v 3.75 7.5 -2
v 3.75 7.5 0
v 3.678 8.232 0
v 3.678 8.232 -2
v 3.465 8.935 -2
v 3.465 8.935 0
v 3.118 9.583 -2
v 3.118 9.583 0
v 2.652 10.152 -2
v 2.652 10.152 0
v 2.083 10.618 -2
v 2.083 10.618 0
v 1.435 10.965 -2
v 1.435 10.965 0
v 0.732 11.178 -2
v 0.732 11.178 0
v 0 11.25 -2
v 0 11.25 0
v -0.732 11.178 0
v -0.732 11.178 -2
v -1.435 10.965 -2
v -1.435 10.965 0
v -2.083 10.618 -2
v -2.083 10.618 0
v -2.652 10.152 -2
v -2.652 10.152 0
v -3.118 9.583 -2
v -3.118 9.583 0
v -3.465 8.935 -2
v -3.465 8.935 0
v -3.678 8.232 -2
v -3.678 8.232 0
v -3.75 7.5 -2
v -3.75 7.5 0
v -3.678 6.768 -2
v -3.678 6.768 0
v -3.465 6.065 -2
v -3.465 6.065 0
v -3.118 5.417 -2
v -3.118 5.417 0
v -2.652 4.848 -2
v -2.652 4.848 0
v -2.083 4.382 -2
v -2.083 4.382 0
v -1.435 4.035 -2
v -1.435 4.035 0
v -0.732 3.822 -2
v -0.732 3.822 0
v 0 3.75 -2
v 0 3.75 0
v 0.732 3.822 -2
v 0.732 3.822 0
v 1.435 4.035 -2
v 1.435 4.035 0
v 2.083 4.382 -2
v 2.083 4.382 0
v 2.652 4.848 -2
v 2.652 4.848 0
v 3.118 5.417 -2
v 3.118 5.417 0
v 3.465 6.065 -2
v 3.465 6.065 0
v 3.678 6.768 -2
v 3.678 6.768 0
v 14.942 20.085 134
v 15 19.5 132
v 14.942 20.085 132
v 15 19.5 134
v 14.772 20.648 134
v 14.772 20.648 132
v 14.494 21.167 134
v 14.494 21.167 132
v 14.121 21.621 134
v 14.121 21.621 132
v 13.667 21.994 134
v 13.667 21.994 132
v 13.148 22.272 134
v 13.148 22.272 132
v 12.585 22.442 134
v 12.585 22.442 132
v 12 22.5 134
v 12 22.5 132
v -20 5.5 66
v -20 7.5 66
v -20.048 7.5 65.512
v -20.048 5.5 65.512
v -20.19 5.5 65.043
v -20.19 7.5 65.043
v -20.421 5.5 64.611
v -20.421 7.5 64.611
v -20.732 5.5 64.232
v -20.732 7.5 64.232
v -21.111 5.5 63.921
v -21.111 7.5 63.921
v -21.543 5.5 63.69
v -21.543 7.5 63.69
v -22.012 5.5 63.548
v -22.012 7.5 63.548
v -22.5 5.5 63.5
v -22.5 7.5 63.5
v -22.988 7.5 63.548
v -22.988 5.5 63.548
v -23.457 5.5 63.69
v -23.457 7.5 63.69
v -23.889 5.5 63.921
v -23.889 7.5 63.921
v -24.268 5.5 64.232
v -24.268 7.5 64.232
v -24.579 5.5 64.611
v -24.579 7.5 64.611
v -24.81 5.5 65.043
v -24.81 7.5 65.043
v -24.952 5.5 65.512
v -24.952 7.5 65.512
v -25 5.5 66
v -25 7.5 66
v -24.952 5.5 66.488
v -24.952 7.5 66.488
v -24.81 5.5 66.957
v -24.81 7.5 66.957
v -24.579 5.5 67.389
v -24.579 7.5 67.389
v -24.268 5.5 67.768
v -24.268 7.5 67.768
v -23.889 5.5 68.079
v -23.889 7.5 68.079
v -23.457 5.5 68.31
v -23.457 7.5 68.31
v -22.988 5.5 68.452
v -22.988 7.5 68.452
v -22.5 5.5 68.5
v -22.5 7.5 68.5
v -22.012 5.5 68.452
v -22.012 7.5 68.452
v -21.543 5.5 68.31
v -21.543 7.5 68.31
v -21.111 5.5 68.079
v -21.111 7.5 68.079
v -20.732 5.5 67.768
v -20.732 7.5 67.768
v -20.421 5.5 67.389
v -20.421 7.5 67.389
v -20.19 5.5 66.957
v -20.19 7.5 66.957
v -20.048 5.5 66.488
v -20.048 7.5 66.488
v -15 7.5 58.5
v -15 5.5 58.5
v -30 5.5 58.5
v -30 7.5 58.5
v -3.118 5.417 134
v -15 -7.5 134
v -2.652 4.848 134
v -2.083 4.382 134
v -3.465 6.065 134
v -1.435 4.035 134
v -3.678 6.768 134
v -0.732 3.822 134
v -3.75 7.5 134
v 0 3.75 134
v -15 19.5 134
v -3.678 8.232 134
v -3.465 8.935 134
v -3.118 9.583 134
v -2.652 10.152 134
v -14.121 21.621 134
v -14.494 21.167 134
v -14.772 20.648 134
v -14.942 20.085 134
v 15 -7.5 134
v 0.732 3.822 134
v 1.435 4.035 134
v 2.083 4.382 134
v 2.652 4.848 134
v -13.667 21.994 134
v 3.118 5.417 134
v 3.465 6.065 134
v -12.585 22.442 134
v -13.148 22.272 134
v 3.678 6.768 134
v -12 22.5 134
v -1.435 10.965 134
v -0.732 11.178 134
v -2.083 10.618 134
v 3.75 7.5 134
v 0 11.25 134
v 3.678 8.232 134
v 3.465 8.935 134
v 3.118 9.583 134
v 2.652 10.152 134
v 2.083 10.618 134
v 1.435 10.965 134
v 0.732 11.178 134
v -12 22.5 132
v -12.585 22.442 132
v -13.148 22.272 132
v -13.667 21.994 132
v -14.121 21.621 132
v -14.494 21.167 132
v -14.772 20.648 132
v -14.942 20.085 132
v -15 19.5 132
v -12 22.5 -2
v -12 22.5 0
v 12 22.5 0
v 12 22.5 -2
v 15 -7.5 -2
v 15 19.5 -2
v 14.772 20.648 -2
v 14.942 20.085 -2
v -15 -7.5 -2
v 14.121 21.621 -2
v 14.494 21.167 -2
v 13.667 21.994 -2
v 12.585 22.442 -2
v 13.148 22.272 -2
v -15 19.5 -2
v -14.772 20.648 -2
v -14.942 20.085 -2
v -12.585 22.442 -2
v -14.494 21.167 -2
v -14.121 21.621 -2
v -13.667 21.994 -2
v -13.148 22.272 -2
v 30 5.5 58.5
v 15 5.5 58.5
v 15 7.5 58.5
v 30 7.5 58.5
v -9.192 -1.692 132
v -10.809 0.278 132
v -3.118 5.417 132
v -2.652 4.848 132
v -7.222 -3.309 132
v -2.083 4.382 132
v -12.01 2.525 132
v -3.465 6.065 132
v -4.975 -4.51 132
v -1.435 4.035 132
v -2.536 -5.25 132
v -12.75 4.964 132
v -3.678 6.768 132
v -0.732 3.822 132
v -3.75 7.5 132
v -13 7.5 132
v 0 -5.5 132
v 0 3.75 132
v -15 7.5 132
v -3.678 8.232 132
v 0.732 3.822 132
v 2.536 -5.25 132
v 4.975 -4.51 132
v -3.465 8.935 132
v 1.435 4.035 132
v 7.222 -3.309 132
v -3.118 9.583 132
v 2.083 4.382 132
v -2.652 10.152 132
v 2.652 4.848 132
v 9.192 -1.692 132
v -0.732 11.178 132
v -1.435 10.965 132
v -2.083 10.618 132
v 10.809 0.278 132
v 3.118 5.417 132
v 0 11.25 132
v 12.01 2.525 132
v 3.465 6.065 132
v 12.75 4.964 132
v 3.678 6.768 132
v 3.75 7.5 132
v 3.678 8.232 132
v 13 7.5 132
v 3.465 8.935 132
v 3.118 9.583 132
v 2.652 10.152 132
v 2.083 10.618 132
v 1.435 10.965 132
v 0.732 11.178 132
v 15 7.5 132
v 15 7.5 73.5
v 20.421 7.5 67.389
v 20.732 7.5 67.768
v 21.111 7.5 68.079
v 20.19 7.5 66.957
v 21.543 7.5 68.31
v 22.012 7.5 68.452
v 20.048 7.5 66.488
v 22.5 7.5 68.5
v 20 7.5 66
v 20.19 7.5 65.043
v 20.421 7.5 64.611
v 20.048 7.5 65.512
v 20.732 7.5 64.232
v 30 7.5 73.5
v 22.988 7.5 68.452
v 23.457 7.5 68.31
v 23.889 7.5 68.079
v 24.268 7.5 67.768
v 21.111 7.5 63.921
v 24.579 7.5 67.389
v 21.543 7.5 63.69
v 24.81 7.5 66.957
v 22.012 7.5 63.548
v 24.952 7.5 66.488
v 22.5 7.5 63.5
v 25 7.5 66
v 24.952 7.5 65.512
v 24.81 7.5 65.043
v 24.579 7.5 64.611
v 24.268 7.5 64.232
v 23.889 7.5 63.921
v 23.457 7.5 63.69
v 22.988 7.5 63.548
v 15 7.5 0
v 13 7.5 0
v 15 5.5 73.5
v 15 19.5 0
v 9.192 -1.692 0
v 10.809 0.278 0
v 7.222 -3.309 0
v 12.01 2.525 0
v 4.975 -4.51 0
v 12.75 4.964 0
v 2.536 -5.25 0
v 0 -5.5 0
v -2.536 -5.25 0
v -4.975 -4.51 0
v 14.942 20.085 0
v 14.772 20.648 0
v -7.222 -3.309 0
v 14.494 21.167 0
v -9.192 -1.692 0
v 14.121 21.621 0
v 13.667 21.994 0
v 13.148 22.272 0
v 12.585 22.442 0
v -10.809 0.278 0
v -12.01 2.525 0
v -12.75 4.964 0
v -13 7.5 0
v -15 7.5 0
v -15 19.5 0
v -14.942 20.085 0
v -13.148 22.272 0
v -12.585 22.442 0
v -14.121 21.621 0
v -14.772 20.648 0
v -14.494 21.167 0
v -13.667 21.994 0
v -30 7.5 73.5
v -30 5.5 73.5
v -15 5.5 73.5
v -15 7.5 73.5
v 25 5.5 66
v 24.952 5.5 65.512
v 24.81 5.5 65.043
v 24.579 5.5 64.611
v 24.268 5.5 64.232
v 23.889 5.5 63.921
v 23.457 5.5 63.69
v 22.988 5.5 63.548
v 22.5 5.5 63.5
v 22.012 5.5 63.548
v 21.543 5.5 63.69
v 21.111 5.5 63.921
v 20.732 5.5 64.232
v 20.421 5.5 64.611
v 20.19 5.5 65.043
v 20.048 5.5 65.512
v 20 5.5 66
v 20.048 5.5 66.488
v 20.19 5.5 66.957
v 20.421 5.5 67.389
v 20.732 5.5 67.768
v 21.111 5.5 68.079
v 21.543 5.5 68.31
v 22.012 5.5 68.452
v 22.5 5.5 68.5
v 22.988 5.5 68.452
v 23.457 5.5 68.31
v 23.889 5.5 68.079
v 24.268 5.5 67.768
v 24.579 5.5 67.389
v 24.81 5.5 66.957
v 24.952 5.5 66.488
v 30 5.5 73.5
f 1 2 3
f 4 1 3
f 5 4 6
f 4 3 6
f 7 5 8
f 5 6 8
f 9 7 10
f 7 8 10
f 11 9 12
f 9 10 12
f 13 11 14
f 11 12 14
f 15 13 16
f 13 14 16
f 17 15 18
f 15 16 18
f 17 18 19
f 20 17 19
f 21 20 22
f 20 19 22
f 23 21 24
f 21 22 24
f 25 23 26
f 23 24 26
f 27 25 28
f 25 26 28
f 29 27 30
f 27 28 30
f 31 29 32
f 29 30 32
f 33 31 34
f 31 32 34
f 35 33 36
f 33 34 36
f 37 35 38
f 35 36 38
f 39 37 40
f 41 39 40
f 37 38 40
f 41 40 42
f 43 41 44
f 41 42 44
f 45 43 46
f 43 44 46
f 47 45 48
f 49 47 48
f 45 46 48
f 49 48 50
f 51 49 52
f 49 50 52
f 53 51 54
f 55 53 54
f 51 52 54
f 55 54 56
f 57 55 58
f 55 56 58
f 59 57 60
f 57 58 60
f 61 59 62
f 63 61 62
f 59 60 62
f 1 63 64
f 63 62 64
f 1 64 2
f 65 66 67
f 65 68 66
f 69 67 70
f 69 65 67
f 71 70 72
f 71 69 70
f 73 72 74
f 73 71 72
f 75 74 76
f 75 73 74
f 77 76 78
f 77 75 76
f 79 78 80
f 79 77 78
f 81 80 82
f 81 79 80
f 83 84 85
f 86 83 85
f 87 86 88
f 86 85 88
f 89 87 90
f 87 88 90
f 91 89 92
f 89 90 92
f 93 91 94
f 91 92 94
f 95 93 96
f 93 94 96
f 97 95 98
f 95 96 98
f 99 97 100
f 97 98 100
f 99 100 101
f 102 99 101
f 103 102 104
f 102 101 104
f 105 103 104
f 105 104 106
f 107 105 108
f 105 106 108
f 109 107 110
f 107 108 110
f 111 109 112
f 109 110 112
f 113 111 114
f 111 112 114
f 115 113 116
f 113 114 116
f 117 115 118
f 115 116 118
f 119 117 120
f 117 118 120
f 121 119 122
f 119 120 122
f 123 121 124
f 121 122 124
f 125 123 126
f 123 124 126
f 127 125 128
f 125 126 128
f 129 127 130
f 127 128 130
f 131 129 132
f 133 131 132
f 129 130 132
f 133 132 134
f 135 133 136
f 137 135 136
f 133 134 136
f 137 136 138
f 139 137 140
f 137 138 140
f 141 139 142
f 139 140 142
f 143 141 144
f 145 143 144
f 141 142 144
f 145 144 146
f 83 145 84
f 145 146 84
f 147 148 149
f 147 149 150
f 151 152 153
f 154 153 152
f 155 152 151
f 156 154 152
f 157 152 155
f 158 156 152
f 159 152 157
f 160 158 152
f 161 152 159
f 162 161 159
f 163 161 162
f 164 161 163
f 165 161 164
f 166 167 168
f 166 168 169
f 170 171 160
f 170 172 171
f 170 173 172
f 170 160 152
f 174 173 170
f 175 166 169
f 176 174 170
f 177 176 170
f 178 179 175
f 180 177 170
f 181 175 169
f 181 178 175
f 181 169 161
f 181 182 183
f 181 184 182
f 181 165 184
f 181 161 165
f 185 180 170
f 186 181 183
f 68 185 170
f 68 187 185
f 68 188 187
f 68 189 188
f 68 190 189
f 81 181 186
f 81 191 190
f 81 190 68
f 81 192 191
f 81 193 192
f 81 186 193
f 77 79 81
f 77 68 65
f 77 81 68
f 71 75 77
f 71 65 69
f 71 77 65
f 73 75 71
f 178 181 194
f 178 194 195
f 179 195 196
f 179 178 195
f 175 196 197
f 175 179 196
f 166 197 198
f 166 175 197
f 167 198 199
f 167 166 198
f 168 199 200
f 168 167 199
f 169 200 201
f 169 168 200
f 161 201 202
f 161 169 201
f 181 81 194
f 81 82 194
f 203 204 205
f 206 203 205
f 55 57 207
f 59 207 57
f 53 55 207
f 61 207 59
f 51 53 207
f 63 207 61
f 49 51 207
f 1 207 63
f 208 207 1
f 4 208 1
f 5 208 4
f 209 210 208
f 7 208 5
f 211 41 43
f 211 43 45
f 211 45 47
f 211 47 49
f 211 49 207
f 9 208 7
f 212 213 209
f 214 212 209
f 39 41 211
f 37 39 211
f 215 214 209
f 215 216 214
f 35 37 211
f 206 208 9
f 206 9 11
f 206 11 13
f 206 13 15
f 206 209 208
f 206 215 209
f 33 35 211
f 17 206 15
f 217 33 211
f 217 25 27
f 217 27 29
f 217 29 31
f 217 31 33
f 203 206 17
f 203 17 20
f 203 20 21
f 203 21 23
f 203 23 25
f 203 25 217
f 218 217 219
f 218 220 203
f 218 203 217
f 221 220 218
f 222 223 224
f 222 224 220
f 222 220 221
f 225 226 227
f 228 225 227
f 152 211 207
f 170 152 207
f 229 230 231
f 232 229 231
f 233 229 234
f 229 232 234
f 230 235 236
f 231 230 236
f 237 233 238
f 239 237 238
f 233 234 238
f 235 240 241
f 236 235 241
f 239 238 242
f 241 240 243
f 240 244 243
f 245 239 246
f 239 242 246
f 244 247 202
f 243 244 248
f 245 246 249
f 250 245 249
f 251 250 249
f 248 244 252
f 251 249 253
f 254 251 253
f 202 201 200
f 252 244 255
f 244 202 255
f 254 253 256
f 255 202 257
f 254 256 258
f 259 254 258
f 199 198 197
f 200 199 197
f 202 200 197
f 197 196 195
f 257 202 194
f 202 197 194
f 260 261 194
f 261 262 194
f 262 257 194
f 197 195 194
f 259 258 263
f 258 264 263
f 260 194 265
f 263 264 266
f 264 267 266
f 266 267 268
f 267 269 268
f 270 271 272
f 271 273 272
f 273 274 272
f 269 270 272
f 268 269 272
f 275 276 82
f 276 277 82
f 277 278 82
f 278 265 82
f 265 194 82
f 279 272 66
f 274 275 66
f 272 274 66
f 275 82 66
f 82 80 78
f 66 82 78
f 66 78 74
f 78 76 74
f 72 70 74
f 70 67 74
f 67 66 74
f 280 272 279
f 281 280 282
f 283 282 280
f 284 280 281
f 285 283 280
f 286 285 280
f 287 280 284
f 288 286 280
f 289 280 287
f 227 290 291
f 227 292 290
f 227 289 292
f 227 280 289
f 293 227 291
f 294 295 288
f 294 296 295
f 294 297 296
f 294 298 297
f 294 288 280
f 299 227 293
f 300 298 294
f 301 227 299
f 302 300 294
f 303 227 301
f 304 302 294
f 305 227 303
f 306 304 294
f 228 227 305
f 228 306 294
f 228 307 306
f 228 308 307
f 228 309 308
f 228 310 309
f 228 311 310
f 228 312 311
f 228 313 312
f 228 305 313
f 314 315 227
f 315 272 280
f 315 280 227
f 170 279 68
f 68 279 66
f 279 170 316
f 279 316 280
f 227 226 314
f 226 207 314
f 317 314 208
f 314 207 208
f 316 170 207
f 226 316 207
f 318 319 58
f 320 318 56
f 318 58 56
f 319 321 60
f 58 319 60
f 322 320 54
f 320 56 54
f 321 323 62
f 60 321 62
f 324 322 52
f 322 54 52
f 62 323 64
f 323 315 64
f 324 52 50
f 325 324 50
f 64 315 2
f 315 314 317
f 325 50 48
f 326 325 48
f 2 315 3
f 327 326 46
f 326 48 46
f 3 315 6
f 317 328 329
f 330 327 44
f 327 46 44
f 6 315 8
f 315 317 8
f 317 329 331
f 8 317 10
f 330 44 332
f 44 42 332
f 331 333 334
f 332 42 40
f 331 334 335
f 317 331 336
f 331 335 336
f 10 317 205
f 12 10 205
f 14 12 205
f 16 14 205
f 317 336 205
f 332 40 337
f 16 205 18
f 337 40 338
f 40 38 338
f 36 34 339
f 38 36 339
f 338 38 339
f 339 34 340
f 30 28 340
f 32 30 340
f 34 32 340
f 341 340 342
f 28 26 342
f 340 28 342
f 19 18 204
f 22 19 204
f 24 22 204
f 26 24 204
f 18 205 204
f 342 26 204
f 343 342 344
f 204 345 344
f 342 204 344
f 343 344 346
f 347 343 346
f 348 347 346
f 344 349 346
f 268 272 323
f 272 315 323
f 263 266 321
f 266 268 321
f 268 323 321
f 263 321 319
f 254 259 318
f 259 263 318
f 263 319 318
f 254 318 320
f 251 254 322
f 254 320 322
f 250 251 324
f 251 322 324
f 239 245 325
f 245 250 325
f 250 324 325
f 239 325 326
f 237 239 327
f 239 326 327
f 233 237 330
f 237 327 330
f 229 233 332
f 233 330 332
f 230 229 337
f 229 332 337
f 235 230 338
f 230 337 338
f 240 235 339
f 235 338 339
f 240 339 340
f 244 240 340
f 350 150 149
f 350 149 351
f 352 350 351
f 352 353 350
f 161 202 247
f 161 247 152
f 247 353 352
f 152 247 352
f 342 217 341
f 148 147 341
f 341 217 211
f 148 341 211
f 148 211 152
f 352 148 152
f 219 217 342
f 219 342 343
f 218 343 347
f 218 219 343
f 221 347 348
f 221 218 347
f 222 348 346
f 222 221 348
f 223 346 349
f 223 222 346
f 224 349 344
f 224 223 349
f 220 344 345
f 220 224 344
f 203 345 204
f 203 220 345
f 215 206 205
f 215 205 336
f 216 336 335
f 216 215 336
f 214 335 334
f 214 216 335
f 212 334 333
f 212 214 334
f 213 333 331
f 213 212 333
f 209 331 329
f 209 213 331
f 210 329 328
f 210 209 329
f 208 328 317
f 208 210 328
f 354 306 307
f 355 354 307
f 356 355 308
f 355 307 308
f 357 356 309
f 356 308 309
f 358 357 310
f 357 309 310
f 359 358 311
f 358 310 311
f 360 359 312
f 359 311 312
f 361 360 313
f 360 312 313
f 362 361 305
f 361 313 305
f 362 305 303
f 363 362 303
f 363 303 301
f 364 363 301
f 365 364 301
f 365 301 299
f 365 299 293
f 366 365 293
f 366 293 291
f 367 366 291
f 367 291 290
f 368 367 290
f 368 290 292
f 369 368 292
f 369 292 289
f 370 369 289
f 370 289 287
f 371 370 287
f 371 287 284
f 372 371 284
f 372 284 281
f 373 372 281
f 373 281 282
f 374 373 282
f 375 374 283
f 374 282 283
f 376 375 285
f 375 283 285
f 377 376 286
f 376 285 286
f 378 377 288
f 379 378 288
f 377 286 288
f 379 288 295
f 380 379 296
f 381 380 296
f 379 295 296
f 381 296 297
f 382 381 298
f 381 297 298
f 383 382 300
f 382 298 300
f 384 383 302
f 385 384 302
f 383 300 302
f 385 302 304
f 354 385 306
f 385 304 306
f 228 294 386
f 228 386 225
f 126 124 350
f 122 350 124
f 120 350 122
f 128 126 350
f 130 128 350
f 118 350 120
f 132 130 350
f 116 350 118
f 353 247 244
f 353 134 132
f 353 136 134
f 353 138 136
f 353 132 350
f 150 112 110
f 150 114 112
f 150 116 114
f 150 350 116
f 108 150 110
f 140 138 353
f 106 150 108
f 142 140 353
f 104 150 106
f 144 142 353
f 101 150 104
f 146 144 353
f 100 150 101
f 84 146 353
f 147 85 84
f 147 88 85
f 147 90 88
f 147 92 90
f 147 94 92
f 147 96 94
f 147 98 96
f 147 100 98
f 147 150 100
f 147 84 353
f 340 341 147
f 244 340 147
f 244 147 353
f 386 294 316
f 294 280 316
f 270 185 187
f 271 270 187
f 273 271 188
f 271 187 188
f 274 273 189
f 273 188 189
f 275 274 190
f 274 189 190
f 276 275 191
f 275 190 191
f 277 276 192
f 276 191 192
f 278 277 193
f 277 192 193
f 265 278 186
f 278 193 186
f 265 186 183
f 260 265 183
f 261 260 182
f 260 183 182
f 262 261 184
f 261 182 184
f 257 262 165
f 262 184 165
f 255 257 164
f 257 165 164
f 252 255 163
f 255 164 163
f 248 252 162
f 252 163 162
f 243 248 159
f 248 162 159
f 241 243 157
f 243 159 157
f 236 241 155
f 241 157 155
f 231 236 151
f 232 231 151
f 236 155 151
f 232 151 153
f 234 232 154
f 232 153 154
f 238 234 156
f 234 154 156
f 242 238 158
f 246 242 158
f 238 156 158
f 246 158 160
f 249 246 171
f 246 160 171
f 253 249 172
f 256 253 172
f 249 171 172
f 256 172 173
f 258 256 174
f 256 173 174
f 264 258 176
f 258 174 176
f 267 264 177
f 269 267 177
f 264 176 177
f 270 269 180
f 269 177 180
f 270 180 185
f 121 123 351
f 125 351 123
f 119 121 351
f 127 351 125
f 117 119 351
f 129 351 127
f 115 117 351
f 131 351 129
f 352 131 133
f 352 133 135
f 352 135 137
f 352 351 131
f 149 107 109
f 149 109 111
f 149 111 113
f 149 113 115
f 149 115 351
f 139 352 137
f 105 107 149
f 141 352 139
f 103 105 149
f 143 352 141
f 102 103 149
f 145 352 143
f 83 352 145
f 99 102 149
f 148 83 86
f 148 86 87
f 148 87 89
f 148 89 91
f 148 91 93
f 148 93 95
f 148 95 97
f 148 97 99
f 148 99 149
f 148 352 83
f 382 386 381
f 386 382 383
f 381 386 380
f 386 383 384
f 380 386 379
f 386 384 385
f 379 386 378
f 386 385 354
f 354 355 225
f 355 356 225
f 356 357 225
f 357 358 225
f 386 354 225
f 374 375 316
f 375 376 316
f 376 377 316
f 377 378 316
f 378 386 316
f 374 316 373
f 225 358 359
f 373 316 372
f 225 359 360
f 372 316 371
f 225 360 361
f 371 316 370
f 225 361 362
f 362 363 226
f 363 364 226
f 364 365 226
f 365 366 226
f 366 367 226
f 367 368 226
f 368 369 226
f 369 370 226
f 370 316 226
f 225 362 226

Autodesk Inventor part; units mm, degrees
ref_plane "YZ Plane" through (0, 0, 0) normal (1, 0, 0) x (0, 1, 0)
ref_plane "XZ Plane" through (0, 0, 0) normal (0, 1, 0) x (-1, 0, 0)
ref_plane "XY Plane" through (0, 0, 0) normal (0, 0, 1) x (1, 0, 0)
sketch "Skizze1" plane through (0, 0, 0) normal (0, 0, 1) x (1, 0, 0)
  line L0 (15, 7.5) -> (15, -7.5)
  line L1 (15, -7.5) -> (-15, -7.5)
  line L2 (-15, -7.5) -> (-15, 7.5)
  line L3 (-15, 7.5) -> (15, -7.5) construction
  line L4 (15, 7.5) -> (-15, -7.5) construction
  arc A0 (-13, 7.5) -> (13, 7.5) centre (0, 7.5) ccw
  line L5 (-15, 7.5) -> (-13, 7.5)
  line L6 (13, 7.5) -> (15, 7.5)
  point P0 (0, 0)
  dimension "d0" = 30
  dimension "d1" = 15
  dimension "d2" = 26
extrude "Extrusion1" add sketch "Skizze1" along normal blind 132
sketch "Skizze2" plane through (-15, -7.5, 0) normal (-1, 0, 0) x (0, 0, 1)
  line L0 (0, 15) -> (0, 2) projected
  line L1 (58.5, 15) -> (66, 15)
  line L2 (0, 15) -> (132, 15) projected
  line L3 (73.5, 15) -> (73.5, 13)
  line L4 (73.5, 13) -> (58.5, 13)
  line L5 (58.5, 13) -> (58.5, 15)
  line L6 (58.5, 17) -> (73.5, 13) construction
  line L7 (73.5, 17) -> (58.5, 13) construction
  line L8 (58.5, 15) -> (73.5, 15)
  point P0 (0, 7.5)
  dimension "d5" = 66
extrude "Extrusion2" add sketch "Skizze2" along normal blind 15
sketch "Skizze3" plane through (15, -7.5, 0) normal (1, 0, 0) x (0, 0, -1)
  line L0 (-73.5, 15) -> (-73.5, 13)
  line L1 (-73.5, 13) -> (-58.5, 13)
  line L2 (-58.5, 13) -> (-58.5, 15)
  line L3 (-58.5, 17) -> (-73.5, 13) construction
  line L4 (-73.5, 17) -> (-58.5, 13) construction
  line L5 (-73.5, 15) -> (-58.5, 15)
  point P0 (0, 7.5)
  dimension "d11" = 15
  dimension "d12" = 4
extrude "Extrusion3" add sketch "Skizze3" along normal blind 15
sketch "Skizze4" plane through (13, 7.5, 132) normal (0, 1, 0) x (1, 0, 0)
  line L0 (2, 58.5) -> (17, 58.5) projected
  line L1 (2, 73.5) -> (2, 58.5) projected
  line L2 (2, 73.5) -> (17, 73.5) projected
  circle A0 centre (9.5, 66) radius 2.5
  line L3 (-28, 58.5) -> (-28, 73.5) projected
  line L4 (-28, 73.5) -> (-43, 73.5) projected
  circle A1 centre (-35.5, 66) radius 2.5
  point P0 (-13, 132)
  point P1 (-43, 58.5)
  dimension "d15" = 5
  dimension "d16" = 5
extrude "Extrusion4" cut sketch "Skizze4" against normal blind 15
sketch "Skizze5" plane through (0, 0, 0) normal (0, 0, -1) x (-1, 0, 0)
  line L0 (15, -7.5) -> (-15, -7.5) projected
  line L1 (-15, -7.5) -> (15, -7.5)
  line L2 (15, -7.5) -> (15, 22.5)
  line L3 (15, 22.5) -> (-15, 22.5)
  line L4 (-15, 22.5) -> (-15, -7.5)
  point P0 (0, 0)
  dimension "d19" = 30
  dimension "d20" = 30
extrude "Extrusion5" add sketch "Skizze5" along normal blind 2
sketch "Skizze6" plane through (0, 0, 132) normal (0, 0, 1) x (1, 0, 0)
  line L0 (-15, -7.5) -> (15, -7.5)
  line L1 (15, -7.5) -> (15, 22.5)
  line L2 (15, 22.5) -> (-15, 22.5)
  line L3 (-15, 22.5) -> (-15, -7.5)
  point P0 (0, 0)
  dimension "d23" = 30
  dimension "d24" = 30
extrude "Extrusion6" add sketch "Skizze6" along normal blind 2
sketch "Skizze7" plane through (0, 0, 134) normal (0, 0, 1) x (1, 0, 0)
  arc A0 (-13, 7.5) -> (13, 7.5) centre (0, 7.5) ccw projected
  circle A1 centre (0, 7.5) radius 3.75
  point P0 (0, 0)
  dimension "d27" = 7.5
extrude "Extrusion7" cut sketch "Skizze7" against normal through all
fillet "Rundung1" radius 3 1 edges at (15, 22.5, 133)
fillet "Rundung2" radius 3 1 edges at (-15, 22.5, 133)
fillet "Rundung3" radius 3 1 edges at (-15, 22.5, -1)
fillet "Rundung4" radius 3 1 edges at (15, 22.5, -1)
properties part number "Motorhalterung_Teil1.1"
